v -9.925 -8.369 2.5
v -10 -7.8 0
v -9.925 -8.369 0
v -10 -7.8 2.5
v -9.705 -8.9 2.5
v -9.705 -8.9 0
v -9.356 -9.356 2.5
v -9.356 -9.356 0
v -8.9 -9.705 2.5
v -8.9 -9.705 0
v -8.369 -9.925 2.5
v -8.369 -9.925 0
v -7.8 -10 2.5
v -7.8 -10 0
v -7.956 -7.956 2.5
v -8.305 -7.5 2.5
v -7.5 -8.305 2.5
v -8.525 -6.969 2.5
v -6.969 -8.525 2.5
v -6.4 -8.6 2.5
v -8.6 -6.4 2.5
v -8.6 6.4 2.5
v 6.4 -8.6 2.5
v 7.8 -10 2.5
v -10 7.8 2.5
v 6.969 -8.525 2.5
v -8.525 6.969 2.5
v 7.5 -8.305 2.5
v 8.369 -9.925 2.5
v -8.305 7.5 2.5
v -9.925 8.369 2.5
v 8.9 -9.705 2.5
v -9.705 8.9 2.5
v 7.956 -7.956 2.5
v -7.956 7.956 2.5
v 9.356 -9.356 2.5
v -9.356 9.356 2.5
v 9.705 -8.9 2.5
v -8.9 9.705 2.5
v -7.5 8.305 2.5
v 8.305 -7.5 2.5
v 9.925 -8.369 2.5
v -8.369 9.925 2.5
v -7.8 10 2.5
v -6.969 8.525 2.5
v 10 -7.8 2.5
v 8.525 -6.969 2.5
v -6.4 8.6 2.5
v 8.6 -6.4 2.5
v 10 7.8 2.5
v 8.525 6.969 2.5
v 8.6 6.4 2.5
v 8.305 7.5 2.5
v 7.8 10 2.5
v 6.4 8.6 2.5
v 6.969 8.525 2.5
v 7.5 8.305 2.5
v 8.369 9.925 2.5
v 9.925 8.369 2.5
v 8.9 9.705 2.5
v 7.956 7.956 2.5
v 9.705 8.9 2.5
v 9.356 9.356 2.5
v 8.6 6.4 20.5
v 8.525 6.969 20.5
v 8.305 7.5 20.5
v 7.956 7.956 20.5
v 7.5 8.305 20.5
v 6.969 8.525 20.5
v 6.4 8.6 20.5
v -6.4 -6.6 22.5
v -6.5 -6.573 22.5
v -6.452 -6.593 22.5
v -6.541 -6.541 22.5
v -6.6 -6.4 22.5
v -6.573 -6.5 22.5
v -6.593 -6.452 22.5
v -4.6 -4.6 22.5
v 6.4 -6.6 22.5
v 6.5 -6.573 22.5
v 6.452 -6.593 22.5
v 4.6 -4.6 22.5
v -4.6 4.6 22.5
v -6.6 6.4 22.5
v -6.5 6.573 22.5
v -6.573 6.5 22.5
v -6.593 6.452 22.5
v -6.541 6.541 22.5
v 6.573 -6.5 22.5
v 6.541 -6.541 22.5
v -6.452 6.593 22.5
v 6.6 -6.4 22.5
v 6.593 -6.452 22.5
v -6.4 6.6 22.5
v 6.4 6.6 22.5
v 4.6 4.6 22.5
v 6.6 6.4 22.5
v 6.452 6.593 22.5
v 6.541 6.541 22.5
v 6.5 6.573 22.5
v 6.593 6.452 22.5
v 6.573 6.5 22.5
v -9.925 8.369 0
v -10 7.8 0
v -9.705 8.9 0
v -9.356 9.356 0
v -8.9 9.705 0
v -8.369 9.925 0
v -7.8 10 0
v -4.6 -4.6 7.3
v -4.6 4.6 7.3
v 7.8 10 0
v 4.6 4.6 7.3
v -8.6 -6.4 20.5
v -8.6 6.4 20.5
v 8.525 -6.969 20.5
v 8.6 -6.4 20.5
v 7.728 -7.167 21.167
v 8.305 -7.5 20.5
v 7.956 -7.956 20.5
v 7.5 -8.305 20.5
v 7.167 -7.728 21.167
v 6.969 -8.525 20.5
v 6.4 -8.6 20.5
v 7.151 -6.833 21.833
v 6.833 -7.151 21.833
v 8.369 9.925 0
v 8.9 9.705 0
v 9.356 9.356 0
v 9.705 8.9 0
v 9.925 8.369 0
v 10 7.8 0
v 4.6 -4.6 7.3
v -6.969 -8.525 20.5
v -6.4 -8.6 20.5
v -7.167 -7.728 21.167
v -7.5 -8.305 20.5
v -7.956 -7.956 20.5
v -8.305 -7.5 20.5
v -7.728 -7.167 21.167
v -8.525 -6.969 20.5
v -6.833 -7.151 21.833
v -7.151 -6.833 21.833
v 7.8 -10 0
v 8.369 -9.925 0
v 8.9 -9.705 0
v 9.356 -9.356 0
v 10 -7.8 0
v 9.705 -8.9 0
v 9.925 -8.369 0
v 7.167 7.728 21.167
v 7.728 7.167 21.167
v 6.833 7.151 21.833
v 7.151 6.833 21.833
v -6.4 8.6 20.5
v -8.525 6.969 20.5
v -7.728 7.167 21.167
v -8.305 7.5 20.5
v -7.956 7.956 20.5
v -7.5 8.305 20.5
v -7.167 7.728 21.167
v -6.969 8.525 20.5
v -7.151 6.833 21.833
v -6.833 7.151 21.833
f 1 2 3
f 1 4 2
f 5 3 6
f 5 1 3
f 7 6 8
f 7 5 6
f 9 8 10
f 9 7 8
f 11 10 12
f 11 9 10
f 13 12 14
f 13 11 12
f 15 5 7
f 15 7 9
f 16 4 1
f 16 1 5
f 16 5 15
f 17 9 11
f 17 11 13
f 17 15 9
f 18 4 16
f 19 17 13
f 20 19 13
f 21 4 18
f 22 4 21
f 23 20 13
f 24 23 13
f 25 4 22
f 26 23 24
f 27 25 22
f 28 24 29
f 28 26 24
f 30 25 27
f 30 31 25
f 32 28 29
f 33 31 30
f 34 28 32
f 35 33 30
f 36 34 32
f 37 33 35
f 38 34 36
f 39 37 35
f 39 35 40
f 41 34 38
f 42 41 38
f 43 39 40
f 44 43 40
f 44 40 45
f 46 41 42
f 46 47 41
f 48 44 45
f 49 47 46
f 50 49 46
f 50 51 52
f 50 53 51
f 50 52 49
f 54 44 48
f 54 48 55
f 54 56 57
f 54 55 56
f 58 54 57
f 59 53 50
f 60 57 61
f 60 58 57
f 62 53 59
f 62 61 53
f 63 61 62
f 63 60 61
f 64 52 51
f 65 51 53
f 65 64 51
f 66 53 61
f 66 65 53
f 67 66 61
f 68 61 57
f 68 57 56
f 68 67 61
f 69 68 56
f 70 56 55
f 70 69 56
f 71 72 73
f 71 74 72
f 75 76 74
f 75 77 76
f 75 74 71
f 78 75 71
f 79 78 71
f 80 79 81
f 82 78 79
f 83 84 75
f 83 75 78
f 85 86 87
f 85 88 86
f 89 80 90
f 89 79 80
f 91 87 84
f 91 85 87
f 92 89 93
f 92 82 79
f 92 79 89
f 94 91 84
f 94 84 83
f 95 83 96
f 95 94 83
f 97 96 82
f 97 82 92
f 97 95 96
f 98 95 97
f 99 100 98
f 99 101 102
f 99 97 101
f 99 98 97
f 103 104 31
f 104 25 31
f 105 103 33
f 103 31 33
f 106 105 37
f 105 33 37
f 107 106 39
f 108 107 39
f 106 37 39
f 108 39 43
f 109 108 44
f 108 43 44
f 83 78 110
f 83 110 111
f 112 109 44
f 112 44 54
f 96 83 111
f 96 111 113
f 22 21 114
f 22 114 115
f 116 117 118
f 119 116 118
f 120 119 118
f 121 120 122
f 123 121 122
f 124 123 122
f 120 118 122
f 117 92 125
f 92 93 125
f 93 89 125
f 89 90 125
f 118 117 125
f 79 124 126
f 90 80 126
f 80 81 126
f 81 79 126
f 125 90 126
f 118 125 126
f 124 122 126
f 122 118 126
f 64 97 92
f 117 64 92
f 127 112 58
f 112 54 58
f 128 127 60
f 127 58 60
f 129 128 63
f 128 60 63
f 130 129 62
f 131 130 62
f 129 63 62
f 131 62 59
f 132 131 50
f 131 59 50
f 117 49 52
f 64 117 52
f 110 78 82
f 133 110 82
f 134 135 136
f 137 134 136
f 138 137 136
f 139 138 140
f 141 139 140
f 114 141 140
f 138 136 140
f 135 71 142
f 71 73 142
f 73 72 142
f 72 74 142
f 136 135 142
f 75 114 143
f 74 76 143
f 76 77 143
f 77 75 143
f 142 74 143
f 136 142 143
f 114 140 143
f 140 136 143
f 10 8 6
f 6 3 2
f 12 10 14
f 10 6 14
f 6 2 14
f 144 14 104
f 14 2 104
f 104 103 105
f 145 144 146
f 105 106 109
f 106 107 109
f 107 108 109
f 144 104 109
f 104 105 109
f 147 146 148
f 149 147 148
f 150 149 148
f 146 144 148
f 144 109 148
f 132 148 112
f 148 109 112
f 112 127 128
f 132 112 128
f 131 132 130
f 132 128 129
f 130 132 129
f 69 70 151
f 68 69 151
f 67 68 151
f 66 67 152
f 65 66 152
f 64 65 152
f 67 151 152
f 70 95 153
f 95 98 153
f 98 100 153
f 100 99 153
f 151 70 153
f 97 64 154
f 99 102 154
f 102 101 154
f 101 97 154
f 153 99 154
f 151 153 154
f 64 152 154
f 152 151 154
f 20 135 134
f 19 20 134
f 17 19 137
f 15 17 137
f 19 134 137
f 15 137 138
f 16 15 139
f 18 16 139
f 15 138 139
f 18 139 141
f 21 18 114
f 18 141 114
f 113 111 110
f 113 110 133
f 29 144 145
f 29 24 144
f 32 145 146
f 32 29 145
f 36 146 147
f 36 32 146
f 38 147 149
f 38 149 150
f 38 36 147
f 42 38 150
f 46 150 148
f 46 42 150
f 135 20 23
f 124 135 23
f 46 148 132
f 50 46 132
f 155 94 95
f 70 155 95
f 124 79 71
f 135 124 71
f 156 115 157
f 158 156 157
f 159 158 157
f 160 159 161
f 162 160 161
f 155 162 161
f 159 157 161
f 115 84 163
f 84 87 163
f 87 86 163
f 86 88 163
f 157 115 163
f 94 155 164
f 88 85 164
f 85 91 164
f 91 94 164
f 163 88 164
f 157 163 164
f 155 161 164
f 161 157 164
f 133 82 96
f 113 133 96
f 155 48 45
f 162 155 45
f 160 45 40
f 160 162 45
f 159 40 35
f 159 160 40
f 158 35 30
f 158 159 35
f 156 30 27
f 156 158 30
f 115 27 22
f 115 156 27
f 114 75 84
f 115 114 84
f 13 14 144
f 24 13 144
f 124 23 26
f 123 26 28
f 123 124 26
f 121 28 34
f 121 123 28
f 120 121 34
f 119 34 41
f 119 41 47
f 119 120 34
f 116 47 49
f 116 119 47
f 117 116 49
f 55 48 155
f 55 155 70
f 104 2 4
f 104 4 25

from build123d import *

# Parameters (mm, degrees)
F0_W     = 20
F0_H     = 20
F1_DEPTH = 2.5
F2_W     = 17.2
F2_H     = 17.2
F3_DEPTH = 20
F4_R     = 2.2
F5_W     = 9.2
F5_H     = 9.2
F6_DEPTH = 15.2
F7_SIZE  = 2


with BuildPart() as f1:
    # F0 (on Top) → F1 (new body)
    with BuildSketch(Plane.XY):
        Rectangle(F0_W, F0_H)
    extrude(amount=F1_DEPTH)

    # F2 (on face) → F3 (join)
    with BuildSketch(Plane.XY.offset(2.5)):
        Rectangle(F2_W, F2_H)
    extrude(amount=F3_DEPTH)

    # F4
    f4_edges = [f1.edges().sort_by_distance(p)[0] for p in [
        (-8.6, -8.6, 12.5),
        (-8.6, 8.6, 12.5),
        (8.6, 8.6, 12.5),
        (8.6, -8.6, 12.5),
        (10, -10, 1.25),
        (10, 10, 1.25),
        (-10, -10, 1.25),
        (-10, 10, 1.25),
    ]]
    fillet(f4_edges, radius=F4_R)

    # F5 (on face) → F6 (cut)
    with BuildSketch(Plane.XY.offset(22.5)):
        Rectangle(F5_W, F5_H)
    extrude(amount=-F6_DEPTH, mode=Mode.SUBTRACT)

    # F7
    f7_edges = [f1.edges().sort_by_distance(p)[0] for p in [
        (0, 8.6, 22.5),
    ]]
    chamfer(f7_edges, length=F7_SIZE)


solid = f1.part
